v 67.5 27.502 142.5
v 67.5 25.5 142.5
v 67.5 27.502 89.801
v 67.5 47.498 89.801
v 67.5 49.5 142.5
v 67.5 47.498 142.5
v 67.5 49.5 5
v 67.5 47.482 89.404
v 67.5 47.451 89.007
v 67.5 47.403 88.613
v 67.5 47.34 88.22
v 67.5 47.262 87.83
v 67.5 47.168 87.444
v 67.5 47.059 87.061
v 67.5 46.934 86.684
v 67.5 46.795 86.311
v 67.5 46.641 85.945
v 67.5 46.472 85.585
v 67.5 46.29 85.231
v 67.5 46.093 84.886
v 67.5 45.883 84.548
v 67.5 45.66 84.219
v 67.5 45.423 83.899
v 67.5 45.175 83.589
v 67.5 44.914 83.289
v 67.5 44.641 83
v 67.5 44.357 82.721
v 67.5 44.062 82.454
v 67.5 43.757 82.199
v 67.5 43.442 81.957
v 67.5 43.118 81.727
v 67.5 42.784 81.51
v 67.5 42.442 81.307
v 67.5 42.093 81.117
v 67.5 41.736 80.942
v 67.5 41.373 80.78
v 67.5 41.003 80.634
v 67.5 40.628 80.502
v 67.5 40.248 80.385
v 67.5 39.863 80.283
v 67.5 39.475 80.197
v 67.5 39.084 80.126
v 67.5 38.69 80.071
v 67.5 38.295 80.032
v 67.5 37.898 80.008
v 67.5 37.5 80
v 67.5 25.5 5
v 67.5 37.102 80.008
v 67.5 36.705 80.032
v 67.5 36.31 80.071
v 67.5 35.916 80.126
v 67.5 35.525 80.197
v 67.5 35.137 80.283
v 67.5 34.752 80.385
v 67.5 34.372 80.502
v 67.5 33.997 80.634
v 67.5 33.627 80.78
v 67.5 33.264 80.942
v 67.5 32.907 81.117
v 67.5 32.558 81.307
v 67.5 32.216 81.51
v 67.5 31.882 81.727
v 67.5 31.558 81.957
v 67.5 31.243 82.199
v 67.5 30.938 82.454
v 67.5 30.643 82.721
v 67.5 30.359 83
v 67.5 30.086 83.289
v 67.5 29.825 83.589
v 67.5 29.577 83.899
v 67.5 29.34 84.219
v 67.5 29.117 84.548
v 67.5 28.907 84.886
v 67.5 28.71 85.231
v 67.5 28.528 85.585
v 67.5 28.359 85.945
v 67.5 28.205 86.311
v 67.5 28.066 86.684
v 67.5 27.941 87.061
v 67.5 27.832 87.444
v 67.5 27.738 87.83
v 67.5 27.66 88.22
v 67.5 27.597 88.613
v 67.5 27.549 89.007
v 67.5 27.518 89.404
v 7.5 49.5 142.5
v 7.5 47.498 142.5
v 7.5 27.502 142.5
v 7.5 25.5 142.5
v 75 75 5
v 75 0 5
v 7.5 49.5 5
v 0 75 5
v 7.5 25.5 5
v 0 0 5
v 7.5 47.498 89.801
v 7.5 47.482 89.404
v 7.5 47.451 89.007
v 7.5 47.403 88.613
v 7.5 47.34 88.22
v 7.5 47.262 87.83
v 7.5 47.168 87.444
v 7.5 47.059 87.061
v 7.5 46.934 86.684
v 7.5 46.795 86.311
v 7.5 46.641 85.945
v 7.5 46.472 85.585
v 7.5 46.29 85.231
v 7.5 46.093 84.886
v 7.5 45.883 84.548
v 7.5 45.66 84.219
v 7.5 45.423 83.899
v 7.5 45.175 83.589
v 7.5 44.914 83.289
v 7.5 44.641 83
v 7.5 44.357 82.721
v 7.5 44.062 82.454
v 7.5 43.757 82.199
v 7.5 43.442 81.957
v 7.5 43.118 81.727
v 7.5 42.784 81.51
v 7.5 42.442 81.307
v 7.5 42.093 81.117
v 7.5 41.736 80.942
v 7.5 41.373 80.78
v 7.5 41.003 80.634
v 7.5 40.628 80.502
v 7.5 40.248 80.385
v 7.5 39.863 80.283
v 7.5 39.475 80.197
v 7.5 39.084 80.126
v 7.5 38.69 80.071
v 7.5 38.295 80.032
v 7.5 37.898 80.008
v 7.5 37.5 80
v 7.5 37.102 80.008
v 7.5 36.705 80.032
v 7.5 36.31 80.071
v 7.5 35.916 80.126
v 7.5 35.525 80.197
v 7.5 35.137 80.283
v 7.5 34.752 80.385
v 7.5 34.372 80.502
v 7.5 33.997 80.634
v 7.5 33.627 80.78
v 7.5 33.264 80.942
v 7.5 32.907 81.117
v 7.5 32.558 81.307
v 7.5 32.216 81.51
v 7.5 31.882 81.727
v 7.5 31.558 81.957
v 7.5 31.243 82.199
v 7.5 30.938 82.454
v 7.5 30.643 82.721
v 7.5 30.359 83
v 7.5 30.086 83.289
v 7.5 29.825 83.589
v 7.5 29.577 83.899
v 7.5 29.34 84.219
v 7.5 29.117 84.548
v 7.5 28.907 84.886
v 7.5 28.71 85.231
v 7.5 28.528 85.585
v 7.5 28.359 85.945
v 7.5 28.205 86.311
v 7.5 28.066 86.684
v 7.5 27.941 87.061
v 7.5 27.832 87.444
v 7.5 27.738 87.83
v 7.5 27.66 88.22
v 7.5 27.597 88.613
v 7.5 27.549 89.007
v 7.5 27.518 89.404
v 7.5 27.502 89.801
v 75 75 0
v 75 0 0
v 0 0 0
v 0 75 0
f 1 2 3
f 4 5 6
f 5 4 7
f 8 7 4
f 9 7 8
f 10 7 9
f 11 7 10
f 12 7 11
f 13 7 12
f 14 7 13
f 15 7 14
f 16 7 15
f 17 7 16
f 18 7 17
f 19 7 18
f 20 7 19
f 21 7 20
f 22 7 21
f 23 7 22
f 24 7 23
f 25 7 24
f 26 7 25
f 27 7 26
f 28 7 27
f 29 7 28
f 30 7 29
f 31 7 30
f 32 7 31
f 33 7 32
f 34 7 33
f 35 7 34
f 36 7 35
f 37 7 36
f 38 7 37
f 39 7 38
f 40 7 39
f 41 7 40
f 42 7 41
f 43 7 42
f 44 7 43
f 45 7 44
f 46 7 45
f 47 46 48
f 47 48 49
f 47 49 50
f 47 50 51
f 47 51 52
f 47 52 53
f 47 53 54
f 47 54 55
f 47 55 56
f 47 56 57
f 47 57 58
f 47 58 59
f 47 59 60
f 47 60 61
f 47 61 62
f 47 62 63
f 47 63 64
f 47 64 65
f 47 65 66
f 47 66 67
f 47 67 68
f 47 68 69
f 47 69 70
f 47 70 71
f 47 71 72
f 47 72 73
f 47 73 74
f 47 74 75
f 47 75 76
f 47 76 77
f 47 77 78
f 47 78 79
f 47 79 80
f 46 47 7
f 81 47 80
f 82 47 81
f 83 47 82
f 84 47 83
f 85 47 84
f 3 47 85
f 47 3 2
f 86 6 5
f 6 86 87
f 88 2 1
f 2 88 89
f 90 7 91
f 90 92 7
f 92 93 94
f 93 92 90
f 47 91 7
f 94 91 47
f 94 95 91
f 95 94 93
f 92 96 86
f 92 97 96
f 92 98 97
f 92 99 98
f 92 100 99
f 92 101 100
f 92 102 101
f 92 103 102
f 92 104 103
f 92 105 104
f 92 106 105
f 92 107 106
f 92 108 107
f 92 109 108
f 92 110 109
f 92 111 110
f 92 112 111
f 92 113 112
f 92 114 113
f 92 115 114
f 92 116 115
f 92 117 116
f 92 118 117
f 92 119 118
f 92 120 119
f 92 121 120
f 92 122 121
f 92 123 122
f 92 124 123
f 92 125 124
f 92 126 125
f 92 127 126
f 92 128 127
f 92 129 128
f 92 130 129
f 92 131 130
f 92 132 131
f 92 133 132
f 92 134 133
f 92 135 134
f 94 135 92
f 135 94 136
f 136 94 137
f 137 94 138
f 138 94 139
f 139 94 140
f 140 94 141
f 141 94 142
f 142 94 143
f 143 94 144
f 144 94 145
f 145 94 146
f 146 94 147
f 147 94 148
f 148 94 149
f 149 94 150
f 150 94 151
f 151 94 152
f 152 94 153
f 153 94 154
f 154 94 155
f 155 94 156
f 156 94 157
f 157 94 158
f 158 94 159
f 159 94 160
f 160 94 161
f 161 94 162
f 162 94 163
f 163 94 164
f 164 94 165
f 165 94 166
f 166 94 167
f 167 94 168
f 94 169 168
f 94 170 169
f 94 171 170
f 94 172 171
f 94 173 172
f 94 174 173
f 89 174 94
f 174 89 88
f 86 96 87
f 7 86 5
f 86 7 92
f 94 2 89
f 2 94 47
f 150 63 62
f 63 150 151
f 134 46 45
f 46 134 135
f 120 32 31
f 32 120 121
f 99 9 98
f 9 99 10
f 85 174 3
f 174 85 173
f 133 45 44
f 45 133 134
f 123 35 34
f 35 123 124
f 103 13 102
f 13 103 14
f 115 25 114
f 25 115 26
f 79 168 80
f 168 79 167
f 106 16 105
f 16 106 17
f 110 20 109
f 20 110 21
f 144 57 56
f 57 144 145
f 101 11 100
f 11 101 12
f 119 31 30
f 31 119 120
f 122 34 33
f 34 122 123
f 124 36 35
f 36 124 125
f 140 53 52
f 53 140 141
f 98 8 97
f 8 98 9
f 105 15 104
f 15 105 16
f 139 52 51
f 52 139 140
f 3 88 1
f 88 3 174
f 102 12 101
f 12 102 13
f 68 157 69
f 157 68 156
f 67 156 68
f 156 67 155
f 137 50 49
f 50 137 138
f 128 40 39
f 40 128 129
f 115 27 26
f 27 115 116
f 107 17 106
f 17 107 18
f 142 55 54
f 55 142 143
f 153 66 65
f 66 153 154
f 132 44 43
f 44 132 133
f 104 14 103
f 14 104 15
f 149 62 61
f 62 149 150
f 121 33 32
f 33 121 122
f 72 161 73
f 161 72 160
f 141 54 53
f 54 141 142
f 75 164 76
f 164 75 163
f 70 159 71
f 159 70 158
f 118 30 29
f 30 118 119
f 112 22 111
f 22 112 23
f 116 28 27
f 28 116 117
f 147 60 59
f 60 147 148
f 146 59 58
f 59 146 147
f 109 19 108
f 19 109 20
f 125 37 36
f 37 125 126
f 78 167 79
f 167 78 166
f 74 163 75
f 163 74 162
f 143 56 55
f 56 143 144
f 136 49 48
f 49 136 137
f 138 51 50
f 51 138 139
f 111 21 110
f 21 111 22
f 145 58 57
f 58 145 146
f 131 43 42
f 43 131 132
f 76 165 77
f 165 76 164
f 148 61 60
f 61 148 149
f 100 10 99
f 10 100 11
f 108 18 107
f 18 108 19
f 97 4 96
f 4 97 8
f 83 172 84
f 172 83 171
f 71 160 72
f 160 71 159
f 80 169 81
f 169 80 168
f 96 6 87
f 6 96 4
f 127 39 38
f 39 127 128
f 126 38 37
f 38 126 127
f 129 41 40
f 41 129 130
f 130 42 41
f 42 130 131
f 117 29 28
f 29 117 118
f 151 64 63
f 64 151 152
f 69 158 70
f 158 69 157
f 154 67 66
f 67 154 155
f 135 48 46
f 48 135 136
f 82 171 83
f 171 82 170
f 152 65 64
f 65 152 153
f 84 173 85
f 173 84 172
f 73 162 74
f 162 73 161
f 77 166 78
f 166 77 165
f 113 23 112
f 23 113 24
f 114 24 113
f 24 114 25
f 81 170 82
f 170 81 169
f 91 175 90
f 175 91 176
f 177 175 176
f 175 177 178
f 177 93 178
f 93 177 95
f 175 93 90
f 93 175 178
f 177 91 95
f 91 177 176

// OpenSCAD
// Render Control
$fa = 1;
$fs = 0.4;

// Dimensions
dock_thickness = 20;
dock_height = 125;
dock_width = 60;
height = 75;
footprint_width = 75;
footprint_depth = 75;
footprint_height = 5;

wall = 2;

// Calculated Dimensions
dock_curve_radius = dock_thickness / 2;

// Model

// Base
cube([footprint_width, footprint_depth, footprint_height]);

// Stand
translate([(footprint_width - dock_width) / 2, (footprint_depth - (dock_thickness + (2 * wall))) / 2, footprint_height]) {
  difference() {
    cube([dock_width, dock_thickness + (2 * wall), height + (dock_height / 2)]);

    hull() {
      translate([0, dock_curve_radius + wall, height + dock_curve_radius]) {
        rotate([0, 90, 0]) {
          cylinder(h = dock_width, r = dock_curve_radius);
        }
      }

      translate([0, dock_curve_radius + wall, height + (dock_height / 2)]) {
        rotate([0, 90, 0]) {
          cylinder(h = dock_width, r = dock_curve_radius);
        }
      }
    }
  }
}
